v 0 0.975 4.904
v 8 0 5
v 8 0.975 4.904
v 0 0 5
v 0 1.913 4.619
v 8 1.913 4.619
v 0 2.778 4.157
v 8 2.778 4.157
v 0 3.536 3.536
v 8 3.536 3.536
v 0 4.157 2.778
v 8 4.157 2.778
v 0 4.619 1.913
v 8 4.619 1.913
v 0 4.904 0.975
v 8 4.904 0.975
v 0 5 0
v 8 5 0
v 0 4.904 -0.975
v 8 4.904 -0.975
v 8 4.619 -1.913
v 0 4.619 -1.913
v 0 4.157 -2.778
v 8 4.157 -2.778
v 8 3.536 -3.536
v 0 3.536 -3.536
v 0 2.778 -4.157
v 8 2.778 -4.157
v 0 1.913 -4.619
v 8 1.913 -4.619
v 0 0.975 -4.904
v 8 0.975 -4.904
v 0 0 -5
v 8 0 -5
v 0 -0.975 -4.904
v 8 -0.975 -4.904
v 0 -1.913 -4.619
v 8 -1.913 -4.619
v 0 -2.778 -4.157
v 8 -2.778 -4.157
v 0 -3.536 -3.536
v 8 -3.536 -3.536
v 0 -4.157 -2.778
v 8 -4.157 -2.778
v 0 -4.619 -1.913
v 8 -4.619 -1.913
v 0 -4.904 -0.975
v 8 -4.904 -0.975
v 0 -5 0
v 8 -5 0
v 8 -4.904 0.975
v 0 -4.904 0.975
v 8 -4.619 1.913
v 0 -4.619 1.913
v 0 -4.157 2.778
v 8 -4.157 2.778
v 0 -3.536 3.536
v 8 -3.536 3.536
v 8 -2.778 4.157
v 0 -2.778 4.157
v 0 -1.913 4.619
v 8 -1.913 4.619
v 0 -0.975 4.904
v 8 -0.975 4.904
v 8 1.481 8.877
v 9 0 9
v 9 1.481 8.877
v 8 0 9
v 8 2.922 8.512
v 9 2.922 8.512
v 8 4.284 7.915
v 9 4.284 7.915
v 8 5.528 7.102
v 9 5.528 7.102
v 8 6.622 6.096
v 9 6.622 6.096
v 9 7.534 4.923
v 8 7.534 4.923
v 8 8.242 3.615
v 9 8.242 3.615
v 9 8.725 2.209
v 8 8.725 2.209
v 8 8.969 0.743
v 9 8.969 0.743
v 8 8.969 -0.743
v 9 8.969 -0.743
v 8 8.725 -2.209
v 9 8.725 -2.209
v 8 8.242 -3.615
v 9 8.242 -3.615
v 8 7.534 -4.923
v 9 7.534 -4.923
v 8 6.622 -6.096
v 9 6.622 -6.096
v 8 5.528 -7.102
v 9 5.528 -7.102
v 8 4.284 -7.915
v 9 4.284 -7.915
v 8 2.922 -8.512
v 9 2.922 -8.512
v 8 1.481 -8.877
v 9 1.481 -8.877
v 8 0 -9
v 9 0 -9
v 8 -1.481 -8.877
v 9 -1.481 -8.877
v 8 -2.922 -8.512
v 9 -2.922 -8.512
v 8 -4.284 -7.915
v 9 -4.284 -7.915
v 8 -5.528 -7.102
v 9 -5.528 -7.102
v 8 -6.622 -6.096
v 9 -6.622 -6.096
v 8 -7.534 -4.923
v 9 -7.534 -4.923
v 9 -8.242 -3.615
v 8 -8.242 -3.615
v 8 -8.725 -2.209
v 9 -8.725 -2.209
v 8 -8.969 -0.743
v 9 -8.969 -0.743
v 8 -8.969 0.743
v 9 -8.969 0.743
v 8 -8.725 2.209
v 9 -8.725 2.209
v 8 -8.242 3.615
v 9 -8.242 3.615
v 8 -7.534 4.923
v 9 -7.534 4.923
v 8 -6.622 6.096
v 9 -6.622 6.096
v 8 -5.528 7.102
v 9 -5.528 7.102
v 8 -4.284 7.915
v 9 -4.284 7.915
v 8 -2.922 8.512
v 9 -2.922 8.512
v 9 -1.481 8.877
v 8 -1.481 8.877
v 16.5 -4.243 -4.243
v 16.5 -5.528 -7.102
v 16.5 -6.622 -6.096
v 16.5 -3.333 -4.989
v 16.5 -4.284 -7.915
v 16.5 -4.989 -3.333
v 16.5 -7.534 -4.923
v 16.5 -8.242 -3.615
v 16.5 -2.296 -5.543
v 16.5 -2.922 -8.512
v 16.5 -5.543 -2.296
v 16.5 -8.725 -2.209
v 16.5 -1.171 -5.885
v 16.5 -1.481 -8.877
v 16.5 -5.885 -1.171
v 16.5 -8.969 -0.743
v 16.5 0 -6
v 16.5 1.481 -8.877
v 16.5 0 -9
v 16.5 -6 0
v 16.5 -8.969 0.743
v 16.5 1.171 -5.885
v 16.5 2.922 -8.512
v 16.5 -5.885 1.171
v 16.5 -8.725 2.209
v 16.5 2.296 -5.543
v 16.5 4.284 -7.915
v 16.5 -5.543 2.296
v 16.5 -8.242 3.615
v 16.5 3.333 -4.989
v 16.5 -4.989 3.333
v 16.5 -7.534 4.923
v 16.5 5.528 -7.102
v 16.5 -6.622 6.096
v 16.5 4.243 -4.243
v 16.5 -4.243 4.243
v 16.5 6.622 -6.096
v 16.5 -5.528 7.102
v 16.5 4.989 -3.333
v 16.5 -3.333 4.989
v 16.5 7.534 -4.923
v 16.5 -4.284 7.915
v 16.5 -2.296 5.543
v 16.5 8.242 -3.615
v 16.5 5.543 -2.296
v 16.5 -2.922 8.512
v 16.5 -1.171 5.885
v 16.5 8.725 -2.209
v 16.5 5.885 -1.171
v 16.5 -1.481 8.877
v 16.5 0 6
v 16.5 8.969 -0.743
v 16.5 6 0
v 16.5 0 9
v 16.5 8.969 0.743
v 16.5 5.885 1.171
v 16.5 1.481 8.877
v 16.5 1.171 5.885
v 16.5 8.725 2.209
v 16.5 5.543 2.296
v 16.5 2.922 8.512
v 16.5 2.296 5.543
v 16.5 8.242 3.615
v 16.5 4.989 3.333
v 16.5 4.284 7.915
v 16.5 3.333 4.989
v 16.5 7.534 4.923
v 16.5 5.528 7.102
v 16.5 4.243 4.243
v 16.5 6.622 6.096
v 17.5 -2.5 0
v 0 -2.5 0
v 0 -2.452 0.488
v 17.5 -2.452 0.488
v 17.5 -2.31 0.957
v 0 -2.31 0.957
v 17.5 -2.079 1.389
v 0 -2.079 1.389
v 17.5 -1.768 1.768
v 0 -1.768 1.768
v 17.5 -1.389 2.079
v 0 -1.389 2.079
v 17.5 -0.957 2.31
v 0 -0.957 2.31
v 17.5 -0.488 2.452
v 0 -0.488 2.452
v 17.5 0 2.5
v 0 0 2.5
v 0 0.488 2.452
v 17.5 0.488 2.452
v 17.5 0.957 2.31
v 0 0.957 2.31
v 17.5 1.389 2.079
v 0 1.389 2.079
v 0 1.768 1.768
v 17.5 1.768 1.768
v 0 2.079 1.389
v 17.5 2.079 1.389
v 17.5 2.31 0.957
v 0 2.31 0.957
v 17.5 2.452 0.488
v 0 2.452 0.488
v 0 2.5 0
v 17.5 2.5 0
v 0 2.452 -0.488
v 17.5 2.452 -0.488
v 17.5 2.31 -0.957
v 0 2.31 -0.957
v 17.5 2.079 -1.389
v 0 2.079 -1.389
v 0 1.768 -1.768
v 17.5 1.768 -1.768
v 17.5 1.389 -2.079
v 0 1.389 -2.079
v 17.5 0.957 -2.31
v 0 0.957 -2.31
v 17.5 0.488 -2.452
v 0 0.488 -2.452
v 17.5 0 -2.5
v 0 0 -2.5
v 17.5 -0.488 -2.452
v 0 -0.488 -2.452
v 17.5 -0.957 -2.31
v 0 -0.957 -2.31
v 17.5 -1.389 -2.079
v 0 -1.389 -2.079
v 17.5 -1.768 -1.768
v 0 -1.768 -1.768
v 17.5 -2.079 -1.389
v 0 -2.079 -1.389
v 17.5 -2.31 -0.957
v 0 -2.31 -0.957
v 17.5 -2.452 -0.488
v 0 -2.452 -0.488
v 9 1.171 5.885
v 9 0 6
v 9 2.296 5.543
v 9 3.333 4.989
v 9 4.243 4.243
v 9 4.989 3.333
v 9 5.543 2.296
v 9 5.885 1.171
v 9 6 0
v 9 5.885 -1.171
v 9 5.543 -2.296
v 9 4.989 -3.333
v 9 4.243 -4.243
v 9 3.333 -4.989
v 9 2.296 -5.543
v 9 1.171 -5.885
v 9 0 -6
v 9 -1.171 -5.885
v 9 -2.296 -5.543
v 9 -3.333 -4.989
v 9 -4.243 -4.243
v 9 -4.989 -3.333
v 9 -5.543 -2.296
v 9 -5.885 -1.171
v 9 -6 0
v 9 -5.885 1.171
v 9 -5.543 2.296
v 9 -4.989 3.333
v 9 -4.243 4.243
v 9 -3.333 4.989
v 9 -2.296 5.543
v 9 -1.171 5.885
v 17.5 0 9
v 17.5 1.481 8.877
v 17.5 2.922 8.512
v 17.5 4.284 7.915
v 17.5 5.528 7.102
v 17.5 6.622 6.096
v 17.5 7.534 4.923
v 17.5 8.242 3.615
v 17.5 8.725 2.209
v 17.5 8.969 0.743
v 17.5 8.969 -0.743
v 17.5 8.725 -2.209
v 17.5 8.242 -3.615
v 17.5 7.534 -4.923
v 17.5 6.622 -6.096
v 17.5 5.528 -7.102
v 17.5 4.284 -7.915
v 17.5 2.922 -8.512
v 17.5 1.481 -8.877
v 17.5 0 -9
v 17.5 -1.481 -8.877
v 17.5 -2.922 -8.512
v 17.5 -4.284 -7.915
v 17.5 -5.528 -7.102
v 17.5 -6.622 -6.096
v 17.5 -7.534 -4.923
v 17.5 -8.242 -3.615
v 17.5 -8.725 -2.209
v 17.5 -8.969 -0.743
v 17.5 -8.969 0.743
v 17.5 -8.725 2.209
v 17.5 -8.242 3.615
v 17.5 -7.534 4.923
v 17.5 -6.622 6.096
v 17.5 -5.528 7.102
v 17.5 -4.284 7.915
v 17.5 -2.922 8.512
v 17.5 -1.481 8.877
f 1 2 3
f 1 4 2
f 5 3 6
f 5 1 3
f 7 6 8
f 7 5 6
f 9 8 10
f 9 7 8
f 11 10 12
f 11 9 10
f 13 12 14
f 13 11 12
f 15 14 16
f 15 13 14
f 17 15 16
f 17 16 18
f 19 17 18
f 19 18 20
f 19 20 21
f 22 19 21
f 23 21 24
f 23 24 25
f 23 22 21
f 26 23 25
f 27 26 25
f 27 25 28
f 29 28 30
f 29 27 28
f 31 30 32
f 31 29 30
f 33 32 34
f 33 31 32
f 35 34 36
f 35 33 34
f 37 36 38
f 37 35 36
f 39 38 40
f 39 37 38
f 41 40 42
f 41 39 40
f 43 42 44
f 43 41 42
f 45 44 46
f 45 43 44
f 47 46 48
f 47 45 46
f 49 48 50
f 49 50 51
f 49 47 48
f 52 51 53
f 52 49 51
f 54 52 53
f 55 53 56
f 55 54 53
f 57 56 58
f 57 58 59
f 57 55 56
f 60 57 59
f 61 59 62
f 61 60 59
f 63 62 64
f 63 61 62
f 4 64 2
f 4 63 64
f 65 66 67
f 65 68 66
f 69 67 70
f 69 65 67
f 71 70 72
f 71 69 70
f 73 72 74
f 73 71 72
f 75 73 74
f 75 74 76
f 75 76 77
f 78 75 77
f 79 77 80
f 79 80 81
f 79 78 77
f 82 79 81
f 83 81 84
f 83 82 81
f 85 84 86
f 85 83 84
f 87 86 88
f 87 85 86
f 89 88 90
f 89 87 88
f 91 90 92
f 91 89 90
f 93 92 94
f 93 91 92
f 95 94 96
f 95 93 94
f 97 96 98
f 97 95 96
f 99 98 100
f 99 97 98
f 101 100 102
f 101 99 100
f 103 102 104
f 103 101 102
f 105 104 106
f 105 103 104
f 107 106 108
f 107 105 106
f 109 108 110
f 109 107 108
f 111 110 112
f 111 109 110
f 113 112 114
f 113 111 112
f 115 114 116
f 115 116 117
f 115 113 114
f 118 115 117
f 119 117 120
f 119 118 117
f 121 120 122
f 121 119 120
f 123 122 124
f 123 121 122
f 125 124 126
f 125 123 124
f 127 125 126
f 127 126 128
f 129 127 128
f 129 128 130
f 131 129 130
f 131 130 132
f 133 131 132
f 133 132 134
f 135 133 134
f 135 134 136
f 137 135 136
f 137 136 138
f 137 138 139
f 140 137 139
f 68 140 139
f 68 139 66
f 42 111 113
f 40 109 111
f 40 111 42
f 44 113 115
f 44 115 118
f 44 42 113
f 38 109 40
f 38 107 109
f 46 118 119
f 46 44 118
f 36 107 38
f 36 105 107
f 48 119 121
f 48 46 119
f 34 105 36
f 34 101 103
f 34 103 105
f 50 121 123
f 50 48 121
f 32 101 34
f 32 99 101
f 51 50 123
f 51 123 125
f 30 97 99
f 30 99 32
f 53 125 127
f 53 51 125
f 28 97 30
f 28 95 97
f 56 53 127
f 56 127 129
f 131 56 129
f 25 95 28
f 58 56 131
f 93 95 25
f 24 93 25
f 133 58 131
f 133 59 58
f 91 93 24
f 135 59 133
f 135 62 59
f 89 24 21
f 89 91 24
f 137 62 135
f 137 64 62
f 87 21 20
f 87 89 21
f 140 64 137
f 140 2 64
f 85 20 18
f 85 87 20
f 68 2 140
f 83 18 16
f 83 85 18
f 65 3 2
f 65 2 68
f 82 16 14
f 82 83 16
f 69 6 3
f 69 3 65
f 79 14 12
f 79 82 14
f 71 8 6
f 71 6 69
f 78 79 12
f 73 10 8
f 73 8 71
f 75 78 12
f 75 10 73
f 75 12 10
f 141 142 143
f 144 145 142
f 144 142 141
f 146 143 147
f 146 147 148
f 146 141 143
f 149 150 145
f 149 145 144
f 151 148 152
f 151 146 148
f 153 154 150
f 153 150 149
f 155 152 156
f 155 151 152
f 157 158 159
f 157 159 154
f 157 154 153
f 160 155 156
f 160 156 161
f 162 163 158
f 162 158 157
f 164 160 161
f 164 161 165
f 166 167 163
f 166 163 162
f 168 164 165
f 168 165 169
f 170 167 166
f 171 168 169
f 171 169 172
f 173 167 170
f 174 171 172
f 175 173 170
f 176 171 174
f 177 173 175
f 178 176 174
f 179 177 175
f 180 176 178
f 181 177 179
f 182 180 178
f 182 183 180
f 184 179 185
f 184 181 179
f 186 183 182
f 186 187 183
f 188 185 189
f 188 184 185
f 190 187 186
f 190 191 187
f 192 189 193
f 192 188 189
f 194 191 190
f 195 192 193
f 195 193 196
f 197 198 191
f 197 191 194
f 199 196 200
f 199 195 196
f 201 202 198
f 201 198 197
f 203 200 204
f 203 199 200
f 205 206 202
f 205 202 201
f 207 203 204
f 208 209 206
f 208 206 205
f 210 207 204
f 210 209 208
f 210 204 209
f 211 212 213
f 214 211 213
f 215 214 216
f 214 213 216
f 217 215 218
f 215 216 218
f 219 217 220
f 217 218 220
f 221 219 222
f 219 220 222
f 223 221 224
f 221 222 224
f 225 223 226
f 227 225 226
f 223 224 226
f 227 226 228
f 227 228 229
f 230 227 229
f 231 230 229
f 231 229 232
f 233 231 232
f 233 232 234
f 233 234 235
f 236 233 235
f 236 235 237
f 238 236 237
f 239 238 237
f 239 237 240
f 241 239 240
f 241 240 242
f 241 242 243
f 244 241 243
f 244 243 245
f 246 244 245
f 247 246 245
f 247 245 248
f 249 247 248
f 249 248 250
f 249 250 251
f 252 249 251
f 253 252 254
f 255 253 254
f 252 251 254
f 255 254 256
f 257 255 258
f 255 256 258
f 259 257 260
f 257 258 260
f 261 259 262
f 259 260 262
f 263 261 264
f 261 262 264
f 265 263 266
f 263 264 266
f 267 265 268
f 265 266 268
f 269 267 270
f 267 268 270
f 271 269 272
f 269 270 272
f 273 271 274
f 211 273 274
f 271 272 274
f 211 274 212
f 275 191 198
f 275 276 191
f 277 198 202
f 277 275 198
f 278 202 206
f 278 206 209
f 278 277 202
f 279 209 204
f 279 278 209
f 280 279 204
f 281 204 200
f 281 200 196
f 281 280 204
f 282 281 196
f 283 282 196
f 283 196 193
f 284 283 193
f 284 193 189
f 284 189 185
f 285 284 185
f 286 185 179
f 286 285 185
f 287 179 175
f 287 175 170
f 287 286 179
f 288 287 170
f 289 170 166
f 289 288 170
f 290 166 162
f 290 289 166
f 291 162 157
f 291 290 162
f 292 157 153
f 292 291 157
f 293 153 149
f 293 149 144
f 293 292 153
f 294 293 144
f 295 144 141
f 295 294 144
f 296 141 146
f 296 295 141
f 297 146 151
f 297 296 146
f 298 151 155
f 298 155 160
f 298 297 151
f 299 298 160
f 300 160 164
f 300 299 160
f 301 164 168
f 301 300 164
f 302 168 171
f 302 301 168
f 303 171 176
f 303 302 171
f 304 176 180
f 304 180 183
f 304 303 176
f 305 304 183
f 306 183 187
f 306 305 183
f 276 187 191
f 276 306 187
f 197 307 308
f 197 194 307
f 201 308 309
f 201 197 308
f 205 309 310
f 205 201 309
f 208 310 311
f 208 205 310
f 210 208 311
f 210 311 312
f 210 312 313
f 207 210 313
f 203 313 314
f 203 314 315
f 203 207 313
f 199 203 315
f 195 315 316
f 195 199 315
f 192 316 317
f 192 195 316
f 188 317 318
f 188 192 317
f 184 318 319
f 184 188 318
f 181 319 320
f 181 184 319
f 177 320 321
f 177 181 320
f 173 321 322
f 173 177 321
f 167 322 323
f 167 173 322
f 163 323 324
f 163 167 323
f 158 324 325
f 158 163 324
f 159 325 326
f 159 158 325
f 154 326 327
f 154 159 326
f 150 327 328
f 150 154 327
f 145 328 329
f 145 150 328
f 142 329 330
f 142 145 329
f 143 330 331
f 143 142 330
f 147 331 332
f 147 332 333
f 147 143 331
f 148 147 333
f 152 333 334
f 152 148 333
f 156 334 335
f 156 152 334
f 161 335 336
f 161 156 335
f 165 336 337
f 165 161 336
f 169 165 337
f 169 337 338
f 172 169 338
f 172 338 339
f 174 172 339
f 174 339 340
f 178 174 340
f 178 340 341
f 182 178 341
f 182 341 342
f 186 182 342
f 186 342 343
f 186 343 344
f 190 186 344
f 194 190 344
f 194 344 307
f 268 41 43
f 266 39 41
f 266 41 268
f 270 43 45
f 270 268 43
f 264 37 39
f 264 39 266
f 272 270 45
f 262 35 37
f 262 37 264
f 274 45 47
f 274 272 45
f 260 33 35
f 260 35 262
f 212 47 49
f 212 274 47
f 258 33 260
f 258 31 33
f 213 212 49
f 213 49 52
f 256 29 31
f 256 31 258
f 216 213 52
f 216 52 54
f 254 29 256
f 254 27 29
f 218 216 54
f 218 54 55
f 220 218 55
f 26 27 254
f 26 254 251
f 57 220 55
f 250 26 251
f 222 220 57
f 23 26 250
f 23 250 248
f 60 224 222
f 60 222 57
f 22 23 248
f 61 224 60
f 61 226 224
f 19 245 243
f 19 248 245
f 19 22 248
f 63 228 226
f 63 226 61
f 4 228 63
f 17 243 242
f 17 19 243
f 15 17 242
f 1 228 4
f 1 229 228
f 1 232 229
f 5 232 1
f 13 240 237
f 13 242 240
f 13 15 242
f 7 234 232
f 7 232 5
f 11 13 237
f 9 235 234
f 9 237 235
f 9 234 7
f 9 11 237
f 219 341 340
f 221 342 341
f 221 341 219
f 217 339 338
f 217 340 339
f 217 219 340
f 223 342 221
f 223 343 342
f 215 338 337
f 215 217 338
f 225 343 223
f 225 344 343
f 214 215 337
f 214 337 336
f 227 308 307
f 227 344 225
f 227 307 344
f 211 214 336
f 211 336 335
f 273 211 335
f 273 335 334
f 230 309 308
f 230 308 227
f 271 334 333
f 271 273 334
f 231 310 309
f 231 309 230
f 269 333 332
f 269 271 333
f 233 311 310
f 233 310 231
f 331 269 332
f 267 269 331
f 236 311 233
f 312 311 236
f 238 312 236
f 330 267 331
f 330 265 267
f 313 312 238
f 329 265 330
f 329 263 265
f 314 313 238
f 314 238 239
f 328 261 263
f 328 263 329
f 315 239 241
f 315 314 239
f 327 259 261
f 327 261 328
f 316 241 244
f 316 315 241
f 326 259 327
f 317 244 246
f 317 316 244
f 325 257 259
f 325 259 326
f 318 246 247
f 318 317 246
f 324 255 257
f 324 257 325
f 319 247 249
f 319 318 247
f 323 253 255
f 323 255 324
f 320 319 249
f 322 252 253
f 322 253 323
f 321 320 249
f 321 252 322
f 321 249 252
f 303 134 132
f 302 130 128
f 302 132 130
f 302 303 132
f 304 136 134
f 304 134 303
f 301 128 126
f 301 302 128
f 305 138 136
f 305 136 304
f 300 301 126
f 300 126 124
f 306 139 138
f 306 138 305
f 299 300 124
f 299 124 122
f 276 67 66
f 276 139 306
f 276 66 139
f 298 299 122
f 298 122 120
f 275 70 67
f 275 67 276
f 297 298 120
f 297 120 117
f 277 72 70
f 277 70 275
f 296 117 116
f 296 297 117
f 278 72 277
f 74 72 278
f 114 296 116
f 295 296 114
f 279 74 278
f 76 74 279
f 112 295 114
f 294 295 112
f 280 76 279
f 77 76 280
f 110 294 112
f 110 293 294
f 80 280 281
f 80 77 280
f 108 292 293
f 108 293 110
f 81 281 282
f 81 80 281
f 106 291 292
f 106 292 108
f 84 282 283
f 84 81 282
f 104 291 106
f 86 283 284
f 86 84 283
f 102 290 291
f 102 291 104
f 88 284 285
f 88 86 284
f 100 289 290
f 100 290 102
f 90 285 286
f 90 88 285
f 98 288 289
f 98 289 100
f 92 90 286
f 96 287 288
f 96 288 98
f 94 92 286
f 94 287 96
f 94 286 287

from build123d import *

# Parameters (mm, degrees)
F2_R     = 2.5
F3_DEPTH = 17.501


with BuildPart() as f1:
    # F0 (on Front) → F1 (revolve)
    with BuildSketch(Plane.XZ):
        Polygon((0, 5), (0, 0), (17.5, 0), (17.5, 9), (16.5, 9), (16.5, 6), (9, 6), (9, 9), (8, 9), (8, 5), align=None)
    revolve(axis=Axis((-7.792865, 0, 0), (-1, 0, 0)))

    # F2 (on face) → F3 (cut, through all)
    with BuildSketch(Plane(origin=(0, 0, 0), x_dir=(0, -1, 0), z_dir=(-1, 0, 0))):
        Circle(F2_R)
    extrude(amount=-F3_DEPTH, mode=Mode.SUBTRACT)


solid = f1.part
